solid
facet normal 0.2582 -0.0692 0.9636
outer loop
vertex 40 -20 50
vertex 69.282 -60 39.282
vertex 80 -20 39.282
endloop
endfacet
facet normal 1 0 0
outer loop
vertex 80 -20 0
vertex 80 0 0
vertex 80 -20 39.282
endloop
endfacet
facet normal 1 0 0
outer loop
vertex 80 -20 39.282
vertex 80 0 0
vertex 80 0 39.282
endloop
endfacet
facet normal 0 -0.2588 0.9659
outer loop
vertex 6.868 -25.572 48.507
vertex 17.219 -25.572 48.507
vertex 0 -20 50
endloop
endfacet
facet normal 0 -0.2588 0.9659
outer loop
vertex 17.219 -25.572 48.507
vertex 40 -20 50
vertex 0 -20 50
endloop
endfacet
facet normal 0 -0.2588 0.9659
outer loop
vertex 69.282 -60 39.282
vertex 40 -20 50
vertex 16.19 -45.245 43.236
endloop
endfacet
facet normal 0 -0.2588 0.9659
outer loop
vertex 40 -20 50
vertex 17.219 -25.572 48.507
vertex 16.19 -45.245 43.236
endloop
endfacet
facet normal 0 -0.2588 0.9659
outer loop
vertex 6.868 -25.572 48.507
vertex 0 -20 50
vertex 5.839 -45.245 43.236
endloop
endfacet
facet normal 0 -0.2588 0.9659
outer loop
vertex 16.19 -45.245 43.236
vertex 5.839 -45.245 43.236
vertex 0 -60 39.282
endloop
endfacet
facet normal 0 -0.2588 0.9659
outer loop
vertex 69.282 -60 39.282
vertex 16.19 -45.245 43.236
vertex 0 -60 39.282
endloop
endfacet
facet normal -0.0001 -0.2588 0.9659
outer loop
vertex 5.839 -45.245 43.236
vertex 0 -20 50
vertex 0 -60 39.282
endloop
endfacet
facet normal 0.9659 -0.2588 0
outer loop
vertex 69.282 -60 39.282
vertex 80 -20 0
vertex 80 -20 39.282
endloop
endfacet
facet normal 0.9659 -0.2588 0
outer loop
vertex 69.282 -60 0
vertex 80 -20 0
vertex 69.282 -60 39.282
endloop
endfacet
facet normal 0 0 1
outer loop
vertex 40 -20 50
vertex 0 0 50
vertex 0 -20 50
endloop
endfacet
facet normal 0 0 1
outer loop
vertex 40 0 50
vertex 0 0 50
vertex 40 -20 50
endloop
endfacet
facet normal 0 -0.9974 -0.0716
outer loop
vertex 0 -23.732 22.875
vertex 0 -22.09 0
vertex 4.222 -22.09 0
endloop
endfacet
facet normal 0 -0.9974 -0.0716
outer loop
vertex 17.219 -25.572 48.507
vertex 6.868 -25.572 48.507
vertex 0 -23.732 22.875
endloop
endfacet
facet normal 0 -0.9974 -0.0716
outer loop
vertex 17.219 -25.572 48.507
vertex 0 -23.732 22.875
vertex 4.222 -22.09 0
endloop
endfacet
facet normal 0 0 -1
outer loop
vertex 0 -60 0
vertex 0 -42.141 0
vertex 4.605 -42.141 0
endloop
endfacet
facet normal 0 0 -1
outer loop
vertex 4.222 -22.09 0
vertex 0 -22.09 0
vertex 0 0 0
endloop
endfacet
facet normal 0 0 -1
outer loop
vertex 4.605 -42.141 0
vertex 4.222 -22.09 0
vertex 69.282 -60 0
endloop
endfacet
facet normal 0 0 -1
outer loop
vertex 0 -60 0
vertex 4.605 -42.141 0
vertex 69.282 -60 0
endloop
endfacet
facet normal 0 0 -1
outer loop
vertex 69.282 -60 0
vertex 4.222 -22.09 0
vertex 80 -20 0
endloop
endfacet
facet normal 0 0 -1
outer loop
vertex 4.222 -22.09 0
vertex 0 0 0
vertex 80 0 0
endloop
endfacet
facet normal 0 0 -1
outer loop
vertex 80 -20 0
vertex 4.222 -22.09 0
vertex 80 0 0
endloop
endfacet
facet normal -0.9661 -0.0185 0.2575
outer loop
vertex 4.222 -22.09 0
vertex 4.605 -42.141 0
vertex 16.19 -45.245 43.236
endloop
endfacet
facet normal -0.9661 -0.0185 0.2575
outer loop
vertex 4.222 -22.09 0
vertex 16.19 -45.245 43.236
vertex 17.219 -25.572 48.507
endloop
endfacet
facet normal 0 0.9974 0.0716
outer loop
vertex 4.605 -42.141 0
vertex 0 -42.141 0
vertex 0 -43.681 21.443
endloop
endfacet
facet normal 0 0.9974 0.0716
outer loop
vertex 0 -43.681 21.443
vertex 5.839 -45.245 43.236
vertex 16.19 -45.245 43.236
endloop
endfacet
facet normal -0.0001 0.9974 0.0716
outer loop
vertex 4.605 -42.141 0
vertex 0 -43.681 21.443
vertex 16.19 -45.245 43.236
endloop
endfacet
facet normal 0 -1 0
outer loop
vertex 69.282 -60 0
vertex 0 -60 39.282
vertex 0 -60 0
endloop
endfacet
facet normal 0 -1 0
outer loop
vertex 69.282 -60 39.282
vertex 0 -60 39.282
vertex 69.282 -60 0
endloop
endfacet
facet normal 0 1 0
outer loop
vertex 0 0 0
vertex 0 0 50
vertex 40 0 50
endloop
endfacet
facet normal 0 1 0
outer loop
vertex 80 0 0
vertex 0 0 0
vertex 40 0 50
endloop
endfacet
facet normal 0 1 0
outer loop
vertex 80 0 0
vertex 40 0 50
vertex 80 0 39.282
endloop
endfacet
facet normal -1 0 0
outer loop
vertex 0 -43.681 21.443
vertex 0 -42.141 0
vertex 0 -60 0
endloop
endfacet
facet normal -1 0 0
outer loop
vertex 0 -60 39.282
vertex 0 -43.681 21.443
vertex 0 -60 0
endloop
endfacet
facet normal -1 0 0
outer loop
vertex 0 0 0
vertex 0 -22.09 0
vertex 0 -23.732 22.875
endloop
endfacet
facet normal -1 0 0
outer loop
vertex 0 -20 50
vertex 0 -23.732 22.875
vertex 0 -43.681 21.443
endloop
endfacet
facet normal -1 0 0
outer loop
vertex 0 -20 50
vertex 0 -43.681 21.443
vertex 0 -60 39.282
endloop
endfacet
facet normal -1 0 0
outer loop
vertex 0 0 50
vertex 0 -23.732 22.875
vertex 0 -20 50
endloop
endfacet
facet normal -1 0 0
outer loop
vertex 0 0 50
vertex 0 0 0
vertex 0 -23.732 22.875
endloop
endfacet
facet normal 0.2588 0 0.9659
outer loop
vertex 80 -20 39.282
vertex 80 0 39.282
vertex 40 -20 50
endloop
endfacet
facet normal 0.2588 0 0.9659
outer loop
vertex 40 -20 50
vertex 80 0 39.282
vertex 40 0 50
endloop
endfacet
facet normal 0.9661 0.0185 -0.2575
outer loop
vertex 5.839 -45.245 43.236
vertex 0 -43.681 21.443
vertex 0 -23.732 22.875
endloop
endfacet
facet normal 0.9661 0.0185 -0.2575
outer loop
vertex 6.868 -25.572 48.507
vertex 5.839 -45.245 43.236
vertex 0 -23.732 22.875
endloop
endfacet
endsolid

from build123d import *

# Parameters (mm, degrees)
F0_W        = 80
F0_H        = 50
F1_DEPTH    = 60
F2_T1_DEPTH = 14.4048552446
F2_T3_DEPTH = 287.737725616
F2_T5_DEPTH = 267.737725616
F2_T7_DEPTH = 257.737725616
F3_W        = 10
F3_H        = 20
F4_DEPTH    = 59.8932080195


# Not quite as in the source:
# - a fillet or chamfer that OpenCascade refuses, or shapes differently, is made with other operations: its cross-section is extruded or revolved along the edge and cut away or added


with BuildPart() as f1:
    # F0 (on Front) → F1 (new body)
    with BuildSketch(Plane.XZ):
        with Locations((40, 25)):
            Rectangle(F0_W, F0_H)
    extrude(amount=F1_DEPTH)

    # F2: chamfer of 40 x 10.7179676972 on 3 edges, made by hand

    # F2_s2 → F2_t1 (cut)
    with BuildSketch(Plane(origin=(15.4641016151, -4.1435935394, 57.7128129211), x_dir=(0.2588190451, 0.9659258263, 0), z_dir=(0.2581988897, -0.069184184, 0.963611375))):
        Polygon((1.3870070824, -68.9498200994), (-8.9657547217, -28.8537460449), (-40.024040134, -68.9498200994), align=None)
    extrude(amount=F2_T1_DEPTH, mode=Mode.SUBTRACT)

    # F2_s4 → F2_t3 (cut)
    with BuildSketch(Plane.YZ.offset(-103.868862808)):
        Polygon((-20, 50), (-60, 39.2820323028), (-60, 50), align=None)
    extrude(amount=F2_T3_DEPTH, mode=Mode.SUBTRACT)

    # F2_s6 → F2_t5 (cut)
    with BuildSketch(Plane.XZ.offset(-103.868862808)):
        Polygon((80, 39.2820323028), (40, 50), (80, 50), align=None)
    extrude(amount=F2_T5_DEPTH, mode=Mode.SUBTRACT)

    # F2_s8 → F2_t7 (cut)
    with BuildSketch(Plane.XY.offset(-103.868862808)):
        Polygon((80, -20), (69.2820323028, -60), (80, -60), align=None)
    extrude(amount=F2_T7_DEPTH, mode=Mode.SUBTRACT)

    # F3 (on face) → F4 (cut, through all)
    with BuildSketch(Plane(origin=(15.4641016151, -4.1435935394, 57.7128129211), x_dir=(0.9660917831, 0.0184902509, -0.2575359728), z_dir=(0.2581988897, -0.069184184, 0.963611375))):
        with Locations((-1.3299316186, -32.0328700794)):
            Rectangle(F3_W, F3_H)
    extrude(amount=-F4_DEPTH, mode=Mode.SUBTRACT)


solid = f1.part
